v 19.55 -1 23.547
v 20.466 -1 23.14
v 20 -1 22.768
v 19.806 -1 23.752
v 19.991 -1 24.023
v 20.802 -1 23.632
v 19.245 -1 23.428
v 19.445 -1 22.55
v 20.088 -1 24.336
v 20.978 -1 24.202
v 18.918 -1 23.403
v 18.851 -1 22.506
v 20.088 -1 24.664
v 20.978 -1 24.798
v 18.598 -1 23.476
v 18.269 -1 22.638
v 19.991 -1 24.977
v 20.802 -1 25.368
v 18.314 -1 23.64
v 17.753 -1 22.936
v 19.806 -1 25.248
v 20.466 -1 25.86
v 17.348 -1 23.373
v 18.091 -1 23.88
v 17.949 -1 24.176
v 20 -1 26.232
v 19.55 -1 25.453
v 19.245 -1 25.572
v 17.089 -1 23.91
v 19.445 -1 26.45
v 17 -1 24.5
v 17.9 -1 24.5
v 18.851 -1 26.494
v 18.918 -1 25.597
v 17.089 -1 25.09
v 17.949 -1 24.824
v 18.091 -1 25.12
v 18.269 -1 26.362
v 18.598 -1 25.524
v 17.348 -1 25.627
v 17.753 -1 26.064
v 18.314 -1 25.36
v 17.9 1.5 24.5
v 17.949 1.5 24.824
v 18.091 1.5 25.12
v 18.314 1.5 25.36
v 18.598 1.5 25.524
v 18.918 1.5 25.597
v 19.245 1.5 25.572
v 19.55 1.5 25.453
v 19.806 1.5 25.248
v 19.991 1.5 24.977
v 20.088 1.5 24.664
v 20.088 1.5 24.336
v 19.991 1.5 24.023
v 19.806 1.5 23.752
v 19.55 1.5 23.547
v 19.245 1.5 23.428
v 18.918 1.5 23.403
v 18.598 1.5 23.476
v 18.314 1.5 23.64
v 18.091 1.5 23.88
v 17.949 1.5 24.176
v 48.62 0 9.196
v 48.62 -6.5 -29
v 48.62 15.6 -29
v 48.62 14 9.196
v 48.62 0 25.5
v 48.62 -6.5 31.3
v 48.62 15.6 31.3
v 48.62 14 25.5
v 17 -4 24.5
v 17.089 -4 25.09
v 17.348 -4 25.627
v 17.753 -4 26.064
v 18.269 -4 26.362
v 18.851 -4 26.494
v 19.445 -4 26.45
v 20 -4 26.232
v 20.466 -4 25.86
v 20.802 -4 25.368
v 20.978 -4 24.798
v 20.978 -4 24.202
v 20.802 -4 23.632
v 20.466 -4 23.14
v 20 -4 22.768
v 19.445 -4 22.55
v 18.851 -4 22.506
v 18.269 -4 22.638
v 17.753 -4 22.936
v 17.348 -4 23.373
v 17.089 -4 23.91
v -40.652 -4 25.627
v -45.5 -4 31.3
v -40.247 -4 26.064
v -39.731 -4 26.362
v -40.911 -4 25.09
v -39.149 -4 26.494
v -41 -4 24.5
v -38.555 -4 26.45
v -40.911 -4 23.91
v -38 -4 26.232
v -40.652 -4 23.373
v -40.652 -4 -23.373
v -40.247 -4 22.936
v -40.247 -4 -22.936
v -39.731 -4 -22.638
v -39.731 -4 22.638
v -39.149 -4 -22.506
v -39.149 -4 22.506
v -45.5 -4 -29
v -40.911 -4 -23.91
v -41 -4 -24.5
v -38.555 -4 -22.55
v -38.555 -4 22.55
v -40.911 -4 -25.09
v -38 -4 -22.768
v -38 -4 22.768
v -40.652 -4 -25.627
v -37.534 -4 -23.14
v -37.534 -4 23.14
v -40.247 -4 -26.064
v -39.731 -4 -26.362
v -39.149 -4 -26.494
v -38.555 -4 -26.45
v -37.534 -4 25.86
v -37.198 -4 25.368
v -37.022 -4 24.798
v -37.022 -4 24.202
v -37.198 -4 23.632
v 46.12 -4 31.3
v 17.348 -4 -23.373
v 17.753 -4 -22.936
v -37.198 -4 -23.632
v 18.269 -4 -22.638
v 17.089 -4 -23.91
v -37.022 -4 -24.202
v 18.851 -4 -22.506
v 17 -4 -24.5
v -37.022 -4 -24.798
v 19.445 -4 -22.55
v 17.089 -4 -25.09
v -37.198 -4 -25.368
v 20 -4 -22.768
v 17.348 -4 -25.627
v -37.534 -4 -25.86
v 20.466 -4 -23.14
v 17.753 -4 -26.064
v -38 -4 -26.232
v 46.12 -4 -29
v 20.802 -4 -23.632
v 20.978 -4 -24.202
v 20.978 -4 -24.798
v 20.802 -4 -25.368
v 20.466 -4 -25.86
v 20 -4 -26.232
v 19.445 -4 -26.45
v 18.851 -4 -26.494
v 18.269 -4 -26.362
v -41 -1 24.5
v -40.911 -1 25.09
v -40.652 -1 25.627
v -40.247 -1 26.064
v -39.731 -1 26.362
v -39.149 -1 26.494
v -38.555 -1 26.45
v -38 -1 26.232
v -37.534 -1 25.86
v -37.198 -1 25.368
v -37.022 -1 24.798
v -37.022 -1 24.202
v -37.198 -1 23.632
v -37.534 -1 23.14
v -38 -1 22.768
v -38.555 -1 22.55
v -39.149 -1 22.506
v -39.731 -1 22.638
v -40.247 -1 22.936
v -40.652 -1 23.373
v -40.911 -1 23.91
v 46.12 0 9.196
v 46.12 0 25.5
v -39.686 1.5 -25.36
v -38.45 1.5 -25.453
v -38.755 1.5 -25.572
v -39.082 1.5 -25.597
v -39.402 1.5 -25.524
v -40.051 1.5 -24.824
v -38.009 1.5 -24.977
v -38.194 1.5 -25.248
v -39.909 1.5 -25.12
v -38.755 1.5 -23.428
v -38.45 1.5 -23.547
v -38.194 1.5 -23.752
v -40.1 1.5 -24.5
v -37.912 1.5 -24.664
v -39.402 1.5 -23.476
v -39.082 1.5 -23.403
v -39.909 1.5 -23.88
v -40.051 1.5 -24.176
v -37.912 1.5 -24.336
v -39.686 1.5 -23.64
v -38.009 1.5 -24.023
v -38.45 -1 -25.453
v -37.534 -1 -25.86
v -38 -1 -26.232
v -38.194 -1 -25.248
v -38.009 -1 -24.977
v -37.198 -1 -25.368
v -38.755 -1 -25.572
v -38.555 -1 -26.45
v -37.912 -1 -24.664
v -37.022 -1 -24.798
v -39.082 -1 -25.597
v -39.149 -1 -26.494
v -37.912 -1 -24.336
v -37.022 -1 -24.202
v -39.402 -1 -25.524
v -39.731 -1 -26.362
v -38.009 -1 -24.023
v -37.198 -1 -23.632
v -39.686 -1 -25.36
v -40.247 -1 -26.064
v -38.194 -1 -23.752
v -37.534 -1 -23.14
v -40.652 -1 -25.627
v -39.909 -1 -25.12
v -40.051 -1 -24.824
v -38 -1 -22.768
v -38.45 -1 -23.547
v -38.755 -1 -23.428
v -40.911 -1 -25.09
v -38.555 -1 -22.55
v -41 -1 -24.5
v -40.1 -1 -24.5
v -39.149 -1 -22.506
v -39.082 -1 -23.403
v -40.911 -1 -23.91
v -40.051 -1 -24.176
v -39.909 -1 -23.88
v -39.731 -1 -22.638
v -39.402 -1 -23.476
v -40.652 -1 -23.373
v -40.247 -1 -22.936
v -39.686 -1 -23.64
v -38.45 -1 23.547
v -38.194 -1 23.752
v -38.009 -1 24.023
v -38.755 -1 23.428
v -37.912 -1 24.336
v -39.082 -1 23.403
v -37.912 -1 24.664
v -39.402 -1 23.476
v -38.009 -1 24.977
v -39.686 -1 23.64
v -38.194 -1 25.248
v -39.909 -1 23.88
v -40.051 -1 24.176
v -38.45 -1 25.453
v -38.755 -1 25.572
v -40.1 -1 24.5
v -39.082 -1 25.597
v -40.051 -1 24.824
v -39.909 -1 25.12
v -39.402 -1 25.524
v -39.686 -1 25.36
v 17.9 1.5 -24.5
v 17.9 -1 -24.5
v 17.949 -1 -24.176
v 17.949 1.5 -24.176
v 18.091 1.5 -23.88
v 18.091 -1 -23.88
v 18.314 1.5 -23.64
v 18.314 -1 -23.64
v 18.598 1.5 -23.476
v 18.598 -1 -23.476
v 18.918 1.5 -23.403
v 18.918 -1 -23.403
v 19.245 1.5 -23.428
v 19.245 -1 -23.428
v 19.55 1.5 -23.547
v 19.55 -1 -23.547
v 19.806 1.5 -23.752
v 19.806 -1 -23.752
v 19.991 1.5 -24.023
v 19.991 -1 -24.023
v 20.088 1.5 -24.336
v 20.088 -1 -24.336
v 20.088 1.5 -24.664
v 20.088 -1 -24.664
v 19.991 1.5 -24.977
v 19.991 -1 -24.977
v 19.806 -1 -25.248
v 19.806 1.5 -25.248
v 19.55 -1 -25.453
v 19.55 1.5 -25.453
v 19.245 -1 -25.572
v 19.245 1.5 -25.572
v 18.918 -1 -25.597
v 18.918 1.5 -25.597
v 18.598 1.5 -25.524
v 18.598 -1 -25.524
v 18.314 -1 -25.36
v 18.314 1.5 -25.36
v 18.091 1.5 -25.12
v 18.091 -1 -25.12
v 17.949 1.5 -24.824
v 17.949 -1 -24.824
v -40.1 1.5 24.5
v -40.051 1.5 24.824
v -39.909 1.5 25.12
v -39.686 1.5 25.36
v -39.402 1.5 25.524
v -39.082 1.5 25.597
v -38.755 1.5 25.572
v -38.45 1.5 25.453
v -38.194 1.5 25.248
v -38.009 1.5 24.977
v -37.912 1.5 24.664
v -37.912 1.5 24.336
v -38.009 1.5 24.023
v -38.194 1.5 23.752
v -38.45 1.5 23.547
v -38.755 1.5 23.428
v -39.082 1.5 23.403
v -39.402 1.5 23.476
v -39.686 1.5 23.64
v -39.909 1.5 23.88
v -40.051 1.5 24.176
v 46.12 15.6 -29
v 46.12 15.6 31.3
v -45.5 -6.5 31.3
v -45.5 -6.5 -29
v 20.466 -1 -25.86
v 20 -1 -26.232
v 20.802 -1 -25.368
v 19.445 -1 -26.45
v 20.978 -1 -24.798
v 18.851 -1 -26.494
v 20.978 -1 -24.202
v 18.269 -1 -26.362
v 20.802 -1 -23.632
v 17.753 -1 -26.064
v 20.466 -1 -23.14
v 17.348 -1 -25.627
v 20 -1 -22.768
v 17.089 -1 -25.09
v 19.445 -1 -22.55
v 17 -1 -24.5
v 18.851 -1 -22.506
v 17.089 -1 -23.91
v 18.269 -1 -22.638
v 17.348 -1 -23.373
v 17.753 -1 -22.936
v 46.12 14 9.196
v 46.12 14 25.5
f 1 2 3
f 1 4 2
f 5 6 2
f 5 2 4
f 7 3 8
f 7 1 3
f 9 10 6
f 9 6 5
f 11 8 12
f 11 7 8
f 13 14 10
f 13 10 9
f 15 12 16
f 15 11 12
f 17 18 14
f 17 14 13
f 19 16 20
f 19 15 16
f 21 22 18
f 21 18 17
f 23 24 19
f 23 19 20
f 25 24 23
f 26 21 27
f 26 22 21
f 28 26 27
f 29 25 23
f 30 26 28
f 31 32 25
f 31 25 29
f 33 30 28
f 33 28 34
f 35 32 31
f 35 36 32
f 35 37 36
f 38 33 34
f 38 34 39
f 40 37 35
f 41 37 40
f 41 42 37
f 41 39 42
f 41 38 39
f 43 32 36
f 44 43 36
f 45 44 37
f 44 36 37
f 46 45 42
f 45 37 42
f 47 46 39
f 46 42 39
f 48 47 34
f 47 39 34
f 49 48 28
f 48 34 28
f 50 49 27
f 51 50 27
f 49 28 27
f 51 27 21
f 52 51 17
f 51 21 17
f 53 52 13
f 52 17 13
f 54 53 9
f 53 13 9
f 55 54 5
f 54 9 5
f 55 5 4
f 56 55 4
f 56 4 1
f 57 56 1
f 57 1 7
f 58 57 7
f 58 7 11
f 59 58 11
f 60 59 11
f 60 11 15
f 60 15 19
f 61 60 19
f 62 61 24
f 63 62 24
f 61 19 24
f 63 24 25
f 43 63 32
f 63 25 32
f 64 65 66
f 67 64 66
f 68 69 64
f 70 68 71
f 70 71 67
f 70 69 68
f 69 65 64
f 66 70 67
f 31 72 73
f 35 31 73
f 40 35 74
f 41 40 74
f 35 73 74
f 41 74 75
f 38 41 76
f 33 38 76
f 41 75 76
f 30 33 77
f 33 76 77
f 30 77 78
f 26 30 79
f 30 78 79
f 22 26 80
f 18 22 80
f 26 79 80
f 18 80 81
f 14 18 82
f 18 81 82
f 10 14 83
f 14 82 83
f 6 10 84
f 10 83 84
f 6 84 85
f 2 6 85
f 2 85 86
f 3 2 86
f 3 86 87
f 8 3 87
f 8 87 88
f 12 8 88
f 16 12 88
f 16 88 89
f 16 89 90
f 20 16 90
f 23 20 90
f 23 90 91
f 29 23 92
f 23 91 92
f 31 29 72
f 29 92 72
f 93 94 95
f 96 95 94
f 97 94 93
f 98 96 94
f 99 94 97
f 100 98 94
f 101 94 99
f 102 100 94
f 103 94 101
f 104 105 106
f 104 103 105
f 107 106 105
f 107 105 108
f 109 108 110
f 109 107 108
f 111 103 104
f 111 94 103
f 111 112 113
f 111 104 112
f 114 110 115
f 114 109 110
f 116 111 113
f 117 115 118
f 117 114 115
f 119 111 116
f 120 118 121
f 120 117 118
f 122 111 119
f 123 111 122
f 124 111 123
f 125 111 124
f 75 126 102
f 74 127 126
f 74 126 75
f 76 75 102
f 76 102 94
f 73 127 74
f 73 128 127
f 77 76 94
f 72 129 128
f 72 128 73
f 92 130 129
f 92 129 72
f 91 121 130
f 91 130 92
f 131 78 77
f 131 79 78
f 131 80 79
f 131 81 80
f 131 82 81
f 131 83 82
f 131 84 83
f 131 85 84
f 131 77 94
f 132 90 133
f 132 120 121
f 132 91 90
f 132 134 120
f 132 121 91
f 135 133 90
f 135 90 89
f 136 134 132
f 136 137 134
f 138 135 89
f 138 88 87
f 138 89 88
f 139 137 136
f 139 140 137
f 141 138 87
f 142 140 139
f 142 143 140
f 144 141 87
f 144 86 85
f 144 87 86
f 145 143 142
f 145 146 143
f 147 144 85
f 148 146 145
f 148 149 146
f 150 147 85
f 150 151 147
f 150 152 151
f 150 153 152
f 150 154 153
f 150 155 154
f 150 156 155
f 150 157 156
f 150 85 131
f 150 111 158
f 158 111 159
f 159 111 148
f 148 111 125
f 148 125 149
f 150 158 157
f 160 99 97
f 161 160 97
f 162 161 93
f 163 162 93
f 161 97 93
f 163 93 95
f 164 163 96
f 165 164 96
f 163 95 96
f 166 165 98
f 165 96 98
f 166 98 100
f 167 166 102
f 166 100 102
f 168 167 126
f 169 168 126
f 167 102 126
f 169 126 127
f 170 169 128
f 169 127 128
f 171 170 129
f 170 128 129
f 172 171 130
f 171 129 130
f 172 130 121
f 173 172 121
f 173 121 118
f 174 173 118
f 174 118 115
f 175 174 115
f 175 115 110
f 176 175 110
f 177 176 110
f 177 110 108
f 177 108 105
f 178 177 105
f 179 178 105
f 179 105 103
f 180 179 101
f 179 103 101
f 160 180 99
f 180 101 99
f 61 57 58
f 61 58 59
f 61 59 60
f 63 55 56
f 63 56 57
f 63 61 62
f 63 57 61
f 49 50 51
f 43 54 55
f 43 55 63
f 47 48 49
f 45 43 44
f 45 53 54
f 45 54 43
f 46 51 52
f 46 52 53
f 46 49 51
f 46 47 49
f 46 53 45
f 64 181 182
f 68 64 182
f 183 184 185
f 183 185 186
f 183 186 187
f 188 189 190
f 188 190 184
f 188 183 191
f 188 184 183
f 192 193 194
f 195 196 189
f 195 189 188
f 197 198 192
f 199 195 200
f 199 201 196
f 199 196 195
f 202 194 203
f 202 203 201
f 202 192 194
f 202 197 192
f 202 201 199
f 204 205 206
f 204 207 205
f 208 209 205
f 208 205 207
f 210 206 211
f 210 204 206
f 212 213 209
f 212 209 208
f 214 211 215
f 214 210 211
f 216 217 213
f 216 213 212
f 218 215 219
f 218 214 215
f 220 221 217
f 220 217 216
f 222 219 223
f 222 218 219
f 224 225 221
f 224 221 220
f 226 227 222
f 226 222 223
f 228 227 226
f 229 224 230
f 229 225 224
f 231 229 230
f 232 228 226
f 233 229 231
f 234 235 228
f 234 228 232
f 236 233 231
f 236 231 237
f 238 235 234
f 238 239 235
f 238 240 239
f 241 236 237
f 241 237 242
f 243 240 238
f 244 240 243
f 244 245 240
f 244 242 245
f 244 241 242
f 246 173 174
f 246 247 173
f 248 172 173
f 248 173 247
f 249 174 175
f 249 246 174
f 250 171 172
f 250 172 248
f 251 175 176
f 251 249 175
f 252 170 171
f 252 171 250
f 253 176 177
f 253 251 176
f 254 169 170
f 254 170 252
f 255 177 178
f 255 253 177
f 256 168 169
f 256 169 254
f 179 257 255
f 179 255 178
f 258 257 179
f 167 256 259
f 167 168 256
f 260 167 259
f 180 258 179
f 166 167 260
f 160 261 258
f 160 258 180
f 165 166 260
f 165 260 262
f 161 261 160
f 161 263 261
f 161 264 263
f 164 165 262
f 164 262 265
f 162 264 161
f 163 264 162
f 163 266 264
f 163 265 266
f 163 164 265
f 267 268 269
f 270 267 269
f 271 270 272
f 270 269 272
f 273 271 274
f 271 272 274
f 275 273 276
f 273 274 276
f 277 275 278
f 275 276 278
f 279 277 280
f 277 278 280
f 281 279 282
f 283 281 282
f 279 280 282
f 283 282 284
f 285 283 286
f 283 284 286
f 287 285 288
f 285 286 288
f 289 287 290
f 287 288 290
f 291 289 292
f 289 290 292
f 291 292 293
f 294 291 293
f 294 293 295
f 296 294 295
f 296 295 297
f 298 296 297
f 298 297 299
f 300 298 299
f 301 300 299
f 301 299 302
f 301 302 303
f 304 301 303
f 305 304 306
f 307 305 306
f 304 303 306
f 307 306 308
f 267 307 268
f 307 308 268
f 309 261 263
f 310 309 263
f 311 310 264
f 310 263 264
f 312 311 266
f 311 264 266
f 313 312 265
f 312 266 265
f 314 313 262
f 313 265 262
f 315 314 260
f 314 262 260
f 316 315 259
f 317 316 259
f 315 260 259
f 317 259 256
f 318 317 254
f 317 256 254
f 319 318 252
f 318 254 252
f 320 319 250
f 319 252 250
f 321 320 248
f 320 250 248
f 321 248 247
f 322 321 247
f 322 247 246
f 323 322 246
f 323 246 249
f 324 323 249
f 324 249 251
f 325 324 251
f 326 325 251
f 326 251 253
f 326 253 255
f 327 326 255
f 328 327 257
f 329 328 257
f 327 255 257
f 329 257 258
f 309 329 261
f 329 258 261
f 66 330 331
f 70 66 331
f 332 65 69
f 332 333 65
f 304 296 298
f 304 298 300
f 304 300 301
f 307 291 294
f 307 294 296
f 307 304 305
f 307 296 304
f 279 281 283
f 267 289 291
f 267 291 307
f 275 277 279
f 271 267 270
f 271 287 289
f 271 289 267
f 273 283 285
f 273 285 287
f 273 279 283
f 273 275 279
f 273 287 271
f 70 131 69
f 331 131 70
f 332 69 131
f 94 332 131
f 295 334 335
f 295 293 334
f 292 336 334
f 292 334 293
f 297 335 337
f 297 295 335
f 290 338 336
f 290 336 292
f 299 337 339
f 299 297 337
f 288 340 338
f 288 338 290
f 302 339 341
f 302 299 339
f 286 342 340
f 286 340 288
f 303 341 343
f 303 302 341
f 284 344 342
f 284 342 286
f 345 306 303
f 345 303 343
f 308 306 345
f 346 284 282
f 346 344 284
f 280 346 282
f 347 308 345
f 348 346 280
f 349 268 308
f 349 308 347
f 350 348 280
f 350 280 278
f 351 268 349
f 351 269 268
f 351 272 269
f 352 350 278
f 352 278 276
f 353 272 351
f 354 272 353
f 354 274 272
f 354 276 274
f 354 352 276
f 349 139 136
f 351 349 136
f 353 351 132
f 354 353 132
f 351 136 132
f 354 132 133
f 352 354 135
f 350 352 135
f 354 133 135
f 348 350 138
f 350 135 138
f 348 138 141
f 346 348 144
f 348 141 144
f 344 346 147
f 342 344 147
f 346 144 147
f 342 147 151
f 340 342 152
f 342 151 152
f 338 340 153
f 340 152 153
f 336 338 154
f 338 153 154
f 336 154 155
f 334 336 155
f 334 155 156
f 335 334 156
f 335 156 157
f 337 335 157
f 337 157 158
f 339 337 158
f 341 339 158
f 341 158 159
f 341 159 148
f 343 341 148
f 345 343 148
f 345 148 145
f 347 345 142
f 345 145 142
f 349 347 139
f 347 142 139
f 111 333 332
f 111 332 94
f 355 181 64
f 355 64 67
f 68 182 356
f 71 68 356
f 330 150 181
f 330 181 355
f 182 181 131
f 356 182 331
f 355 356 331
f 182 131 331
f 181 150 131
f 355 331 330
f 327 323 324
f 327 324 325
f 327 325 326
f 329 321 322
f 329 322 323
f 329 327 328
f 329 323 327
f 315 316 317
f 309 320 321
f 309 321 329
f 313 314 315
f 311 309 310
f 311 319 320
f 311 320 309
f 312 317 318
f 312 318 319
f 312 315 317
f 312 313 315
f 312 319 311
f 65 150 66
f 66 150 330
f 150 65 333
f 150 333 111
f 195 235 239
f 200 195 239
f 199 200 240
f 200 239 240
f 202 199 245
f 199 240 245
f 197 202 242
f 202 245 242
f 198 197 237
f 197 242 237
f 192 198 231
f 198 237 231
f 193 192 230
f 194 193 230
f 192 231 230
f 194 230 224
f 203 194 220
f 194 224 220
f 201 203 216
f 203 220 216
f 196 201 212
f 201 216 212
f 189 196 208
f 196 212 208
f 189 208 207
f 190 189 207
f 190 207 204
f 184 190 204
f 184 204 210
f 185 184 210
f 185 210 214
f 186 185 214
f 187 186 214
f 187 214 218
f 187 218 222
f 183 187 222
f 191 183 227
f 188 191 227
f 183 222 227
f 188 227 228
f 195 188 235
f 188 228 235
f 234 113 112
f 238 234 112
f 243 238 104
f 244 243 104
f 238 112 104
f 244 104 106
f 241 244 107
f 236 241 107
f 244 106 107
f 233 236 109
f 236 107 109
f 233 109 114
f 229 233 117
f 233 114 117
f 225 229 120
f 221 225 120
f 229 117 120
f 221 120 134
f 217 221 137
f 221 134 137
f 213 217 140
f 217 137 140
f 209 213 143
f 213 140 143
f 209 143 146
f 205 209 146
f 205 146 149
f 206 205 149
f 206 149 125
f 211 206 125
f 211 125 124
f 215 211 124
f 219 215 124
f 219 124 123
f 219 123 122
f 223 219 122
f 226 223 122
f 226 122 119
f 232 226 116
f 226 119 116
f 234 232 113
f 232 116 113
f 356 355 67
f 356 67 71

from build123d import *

# Parameters (mm, degrees)
BOX_W         = 91.62
BOX_H         = 2.5
BOX_DEPTH     = 60.3
SKETCH_R      = 2
PAD_DEPTH     = 3
SKETCH001_W   = 22.1
SKETCH001_H   = 60.3
SKETCH001_W_2 = 14
SKETCH001_H_2 = 16.304
PAD001_DEPTH  = 2.5
SKETCH002_R   = 1.1
PAD002_DEPTH  = 2.5


with BuildPart() as part:
    # Box → Box (new body)
    with BuildSketch(Plane(origin=(-45.5, -6.5, -29), x_dir=(1, 0, 0), z_dir=(0, 0, 1))):
        with Locations((45.81, 1.25)):
            Rectangle(BOX_W, BOX_H)
    extrude(amount=BOX_DEPTH)

    # Sketch → Pad (new body)
    with BuildSketch(Plane(origin=(-45.5, -4, -29), x_dir=(-1, 0, 0), z_dir=(0, 1, 0))):
        with Locations((-6.5, 4.5)):
            Circle(SKETCH_R)
        with Locations((-64.5, 4.5)):
            Circle(SKETCH_R)
        with Locations((-64.5, 53.5)):
            Circle(SKETCH_R)
        with Locations((-6.5, 53.5)):
            Circle(SKETCH_R)
    extrude(amount=PAD_DEPTH)

    # Sketch001 → Pad001 (new body)
    with BuildSketch(Plane(origin=(46.12, -6.5, -29), x_dir=(0, 1, 0), z_dir=(1, 0, 0))):
        with Locations((11.05, 30.15)):
            Rectangle(SKETCH001_W, SKETCH001_H)
        with Locations((13.5, 46.348)):
            Rectangle(SKETCH001_W_2, SKETCH001_H_2, mode=Mode.SUBTRACT)
    extrude(amount=PAD001_DEPTH)

    # Sketch002 → Pad002 (new body)
    with BuildSketch(Plane(origin=(-45.5, -1, -29), x_dir=(-1, 0, 0), z_dir=(0, 1, 0))):
        with Locations((-64.5, 4.5)):
            Circle(SKETCH002_R)
        with Locations((-64.5, 53.5)):
            Circle(SKETCH002_R)
        with Locations((-6.5, 53.5)):
            Circle(SKETCH002_R)
        with Locations((-6.5, 4.5)):
            Circle(SKETCH002_R)
    extrude(amount=PAD002_DEPTH)


solid = part.part
